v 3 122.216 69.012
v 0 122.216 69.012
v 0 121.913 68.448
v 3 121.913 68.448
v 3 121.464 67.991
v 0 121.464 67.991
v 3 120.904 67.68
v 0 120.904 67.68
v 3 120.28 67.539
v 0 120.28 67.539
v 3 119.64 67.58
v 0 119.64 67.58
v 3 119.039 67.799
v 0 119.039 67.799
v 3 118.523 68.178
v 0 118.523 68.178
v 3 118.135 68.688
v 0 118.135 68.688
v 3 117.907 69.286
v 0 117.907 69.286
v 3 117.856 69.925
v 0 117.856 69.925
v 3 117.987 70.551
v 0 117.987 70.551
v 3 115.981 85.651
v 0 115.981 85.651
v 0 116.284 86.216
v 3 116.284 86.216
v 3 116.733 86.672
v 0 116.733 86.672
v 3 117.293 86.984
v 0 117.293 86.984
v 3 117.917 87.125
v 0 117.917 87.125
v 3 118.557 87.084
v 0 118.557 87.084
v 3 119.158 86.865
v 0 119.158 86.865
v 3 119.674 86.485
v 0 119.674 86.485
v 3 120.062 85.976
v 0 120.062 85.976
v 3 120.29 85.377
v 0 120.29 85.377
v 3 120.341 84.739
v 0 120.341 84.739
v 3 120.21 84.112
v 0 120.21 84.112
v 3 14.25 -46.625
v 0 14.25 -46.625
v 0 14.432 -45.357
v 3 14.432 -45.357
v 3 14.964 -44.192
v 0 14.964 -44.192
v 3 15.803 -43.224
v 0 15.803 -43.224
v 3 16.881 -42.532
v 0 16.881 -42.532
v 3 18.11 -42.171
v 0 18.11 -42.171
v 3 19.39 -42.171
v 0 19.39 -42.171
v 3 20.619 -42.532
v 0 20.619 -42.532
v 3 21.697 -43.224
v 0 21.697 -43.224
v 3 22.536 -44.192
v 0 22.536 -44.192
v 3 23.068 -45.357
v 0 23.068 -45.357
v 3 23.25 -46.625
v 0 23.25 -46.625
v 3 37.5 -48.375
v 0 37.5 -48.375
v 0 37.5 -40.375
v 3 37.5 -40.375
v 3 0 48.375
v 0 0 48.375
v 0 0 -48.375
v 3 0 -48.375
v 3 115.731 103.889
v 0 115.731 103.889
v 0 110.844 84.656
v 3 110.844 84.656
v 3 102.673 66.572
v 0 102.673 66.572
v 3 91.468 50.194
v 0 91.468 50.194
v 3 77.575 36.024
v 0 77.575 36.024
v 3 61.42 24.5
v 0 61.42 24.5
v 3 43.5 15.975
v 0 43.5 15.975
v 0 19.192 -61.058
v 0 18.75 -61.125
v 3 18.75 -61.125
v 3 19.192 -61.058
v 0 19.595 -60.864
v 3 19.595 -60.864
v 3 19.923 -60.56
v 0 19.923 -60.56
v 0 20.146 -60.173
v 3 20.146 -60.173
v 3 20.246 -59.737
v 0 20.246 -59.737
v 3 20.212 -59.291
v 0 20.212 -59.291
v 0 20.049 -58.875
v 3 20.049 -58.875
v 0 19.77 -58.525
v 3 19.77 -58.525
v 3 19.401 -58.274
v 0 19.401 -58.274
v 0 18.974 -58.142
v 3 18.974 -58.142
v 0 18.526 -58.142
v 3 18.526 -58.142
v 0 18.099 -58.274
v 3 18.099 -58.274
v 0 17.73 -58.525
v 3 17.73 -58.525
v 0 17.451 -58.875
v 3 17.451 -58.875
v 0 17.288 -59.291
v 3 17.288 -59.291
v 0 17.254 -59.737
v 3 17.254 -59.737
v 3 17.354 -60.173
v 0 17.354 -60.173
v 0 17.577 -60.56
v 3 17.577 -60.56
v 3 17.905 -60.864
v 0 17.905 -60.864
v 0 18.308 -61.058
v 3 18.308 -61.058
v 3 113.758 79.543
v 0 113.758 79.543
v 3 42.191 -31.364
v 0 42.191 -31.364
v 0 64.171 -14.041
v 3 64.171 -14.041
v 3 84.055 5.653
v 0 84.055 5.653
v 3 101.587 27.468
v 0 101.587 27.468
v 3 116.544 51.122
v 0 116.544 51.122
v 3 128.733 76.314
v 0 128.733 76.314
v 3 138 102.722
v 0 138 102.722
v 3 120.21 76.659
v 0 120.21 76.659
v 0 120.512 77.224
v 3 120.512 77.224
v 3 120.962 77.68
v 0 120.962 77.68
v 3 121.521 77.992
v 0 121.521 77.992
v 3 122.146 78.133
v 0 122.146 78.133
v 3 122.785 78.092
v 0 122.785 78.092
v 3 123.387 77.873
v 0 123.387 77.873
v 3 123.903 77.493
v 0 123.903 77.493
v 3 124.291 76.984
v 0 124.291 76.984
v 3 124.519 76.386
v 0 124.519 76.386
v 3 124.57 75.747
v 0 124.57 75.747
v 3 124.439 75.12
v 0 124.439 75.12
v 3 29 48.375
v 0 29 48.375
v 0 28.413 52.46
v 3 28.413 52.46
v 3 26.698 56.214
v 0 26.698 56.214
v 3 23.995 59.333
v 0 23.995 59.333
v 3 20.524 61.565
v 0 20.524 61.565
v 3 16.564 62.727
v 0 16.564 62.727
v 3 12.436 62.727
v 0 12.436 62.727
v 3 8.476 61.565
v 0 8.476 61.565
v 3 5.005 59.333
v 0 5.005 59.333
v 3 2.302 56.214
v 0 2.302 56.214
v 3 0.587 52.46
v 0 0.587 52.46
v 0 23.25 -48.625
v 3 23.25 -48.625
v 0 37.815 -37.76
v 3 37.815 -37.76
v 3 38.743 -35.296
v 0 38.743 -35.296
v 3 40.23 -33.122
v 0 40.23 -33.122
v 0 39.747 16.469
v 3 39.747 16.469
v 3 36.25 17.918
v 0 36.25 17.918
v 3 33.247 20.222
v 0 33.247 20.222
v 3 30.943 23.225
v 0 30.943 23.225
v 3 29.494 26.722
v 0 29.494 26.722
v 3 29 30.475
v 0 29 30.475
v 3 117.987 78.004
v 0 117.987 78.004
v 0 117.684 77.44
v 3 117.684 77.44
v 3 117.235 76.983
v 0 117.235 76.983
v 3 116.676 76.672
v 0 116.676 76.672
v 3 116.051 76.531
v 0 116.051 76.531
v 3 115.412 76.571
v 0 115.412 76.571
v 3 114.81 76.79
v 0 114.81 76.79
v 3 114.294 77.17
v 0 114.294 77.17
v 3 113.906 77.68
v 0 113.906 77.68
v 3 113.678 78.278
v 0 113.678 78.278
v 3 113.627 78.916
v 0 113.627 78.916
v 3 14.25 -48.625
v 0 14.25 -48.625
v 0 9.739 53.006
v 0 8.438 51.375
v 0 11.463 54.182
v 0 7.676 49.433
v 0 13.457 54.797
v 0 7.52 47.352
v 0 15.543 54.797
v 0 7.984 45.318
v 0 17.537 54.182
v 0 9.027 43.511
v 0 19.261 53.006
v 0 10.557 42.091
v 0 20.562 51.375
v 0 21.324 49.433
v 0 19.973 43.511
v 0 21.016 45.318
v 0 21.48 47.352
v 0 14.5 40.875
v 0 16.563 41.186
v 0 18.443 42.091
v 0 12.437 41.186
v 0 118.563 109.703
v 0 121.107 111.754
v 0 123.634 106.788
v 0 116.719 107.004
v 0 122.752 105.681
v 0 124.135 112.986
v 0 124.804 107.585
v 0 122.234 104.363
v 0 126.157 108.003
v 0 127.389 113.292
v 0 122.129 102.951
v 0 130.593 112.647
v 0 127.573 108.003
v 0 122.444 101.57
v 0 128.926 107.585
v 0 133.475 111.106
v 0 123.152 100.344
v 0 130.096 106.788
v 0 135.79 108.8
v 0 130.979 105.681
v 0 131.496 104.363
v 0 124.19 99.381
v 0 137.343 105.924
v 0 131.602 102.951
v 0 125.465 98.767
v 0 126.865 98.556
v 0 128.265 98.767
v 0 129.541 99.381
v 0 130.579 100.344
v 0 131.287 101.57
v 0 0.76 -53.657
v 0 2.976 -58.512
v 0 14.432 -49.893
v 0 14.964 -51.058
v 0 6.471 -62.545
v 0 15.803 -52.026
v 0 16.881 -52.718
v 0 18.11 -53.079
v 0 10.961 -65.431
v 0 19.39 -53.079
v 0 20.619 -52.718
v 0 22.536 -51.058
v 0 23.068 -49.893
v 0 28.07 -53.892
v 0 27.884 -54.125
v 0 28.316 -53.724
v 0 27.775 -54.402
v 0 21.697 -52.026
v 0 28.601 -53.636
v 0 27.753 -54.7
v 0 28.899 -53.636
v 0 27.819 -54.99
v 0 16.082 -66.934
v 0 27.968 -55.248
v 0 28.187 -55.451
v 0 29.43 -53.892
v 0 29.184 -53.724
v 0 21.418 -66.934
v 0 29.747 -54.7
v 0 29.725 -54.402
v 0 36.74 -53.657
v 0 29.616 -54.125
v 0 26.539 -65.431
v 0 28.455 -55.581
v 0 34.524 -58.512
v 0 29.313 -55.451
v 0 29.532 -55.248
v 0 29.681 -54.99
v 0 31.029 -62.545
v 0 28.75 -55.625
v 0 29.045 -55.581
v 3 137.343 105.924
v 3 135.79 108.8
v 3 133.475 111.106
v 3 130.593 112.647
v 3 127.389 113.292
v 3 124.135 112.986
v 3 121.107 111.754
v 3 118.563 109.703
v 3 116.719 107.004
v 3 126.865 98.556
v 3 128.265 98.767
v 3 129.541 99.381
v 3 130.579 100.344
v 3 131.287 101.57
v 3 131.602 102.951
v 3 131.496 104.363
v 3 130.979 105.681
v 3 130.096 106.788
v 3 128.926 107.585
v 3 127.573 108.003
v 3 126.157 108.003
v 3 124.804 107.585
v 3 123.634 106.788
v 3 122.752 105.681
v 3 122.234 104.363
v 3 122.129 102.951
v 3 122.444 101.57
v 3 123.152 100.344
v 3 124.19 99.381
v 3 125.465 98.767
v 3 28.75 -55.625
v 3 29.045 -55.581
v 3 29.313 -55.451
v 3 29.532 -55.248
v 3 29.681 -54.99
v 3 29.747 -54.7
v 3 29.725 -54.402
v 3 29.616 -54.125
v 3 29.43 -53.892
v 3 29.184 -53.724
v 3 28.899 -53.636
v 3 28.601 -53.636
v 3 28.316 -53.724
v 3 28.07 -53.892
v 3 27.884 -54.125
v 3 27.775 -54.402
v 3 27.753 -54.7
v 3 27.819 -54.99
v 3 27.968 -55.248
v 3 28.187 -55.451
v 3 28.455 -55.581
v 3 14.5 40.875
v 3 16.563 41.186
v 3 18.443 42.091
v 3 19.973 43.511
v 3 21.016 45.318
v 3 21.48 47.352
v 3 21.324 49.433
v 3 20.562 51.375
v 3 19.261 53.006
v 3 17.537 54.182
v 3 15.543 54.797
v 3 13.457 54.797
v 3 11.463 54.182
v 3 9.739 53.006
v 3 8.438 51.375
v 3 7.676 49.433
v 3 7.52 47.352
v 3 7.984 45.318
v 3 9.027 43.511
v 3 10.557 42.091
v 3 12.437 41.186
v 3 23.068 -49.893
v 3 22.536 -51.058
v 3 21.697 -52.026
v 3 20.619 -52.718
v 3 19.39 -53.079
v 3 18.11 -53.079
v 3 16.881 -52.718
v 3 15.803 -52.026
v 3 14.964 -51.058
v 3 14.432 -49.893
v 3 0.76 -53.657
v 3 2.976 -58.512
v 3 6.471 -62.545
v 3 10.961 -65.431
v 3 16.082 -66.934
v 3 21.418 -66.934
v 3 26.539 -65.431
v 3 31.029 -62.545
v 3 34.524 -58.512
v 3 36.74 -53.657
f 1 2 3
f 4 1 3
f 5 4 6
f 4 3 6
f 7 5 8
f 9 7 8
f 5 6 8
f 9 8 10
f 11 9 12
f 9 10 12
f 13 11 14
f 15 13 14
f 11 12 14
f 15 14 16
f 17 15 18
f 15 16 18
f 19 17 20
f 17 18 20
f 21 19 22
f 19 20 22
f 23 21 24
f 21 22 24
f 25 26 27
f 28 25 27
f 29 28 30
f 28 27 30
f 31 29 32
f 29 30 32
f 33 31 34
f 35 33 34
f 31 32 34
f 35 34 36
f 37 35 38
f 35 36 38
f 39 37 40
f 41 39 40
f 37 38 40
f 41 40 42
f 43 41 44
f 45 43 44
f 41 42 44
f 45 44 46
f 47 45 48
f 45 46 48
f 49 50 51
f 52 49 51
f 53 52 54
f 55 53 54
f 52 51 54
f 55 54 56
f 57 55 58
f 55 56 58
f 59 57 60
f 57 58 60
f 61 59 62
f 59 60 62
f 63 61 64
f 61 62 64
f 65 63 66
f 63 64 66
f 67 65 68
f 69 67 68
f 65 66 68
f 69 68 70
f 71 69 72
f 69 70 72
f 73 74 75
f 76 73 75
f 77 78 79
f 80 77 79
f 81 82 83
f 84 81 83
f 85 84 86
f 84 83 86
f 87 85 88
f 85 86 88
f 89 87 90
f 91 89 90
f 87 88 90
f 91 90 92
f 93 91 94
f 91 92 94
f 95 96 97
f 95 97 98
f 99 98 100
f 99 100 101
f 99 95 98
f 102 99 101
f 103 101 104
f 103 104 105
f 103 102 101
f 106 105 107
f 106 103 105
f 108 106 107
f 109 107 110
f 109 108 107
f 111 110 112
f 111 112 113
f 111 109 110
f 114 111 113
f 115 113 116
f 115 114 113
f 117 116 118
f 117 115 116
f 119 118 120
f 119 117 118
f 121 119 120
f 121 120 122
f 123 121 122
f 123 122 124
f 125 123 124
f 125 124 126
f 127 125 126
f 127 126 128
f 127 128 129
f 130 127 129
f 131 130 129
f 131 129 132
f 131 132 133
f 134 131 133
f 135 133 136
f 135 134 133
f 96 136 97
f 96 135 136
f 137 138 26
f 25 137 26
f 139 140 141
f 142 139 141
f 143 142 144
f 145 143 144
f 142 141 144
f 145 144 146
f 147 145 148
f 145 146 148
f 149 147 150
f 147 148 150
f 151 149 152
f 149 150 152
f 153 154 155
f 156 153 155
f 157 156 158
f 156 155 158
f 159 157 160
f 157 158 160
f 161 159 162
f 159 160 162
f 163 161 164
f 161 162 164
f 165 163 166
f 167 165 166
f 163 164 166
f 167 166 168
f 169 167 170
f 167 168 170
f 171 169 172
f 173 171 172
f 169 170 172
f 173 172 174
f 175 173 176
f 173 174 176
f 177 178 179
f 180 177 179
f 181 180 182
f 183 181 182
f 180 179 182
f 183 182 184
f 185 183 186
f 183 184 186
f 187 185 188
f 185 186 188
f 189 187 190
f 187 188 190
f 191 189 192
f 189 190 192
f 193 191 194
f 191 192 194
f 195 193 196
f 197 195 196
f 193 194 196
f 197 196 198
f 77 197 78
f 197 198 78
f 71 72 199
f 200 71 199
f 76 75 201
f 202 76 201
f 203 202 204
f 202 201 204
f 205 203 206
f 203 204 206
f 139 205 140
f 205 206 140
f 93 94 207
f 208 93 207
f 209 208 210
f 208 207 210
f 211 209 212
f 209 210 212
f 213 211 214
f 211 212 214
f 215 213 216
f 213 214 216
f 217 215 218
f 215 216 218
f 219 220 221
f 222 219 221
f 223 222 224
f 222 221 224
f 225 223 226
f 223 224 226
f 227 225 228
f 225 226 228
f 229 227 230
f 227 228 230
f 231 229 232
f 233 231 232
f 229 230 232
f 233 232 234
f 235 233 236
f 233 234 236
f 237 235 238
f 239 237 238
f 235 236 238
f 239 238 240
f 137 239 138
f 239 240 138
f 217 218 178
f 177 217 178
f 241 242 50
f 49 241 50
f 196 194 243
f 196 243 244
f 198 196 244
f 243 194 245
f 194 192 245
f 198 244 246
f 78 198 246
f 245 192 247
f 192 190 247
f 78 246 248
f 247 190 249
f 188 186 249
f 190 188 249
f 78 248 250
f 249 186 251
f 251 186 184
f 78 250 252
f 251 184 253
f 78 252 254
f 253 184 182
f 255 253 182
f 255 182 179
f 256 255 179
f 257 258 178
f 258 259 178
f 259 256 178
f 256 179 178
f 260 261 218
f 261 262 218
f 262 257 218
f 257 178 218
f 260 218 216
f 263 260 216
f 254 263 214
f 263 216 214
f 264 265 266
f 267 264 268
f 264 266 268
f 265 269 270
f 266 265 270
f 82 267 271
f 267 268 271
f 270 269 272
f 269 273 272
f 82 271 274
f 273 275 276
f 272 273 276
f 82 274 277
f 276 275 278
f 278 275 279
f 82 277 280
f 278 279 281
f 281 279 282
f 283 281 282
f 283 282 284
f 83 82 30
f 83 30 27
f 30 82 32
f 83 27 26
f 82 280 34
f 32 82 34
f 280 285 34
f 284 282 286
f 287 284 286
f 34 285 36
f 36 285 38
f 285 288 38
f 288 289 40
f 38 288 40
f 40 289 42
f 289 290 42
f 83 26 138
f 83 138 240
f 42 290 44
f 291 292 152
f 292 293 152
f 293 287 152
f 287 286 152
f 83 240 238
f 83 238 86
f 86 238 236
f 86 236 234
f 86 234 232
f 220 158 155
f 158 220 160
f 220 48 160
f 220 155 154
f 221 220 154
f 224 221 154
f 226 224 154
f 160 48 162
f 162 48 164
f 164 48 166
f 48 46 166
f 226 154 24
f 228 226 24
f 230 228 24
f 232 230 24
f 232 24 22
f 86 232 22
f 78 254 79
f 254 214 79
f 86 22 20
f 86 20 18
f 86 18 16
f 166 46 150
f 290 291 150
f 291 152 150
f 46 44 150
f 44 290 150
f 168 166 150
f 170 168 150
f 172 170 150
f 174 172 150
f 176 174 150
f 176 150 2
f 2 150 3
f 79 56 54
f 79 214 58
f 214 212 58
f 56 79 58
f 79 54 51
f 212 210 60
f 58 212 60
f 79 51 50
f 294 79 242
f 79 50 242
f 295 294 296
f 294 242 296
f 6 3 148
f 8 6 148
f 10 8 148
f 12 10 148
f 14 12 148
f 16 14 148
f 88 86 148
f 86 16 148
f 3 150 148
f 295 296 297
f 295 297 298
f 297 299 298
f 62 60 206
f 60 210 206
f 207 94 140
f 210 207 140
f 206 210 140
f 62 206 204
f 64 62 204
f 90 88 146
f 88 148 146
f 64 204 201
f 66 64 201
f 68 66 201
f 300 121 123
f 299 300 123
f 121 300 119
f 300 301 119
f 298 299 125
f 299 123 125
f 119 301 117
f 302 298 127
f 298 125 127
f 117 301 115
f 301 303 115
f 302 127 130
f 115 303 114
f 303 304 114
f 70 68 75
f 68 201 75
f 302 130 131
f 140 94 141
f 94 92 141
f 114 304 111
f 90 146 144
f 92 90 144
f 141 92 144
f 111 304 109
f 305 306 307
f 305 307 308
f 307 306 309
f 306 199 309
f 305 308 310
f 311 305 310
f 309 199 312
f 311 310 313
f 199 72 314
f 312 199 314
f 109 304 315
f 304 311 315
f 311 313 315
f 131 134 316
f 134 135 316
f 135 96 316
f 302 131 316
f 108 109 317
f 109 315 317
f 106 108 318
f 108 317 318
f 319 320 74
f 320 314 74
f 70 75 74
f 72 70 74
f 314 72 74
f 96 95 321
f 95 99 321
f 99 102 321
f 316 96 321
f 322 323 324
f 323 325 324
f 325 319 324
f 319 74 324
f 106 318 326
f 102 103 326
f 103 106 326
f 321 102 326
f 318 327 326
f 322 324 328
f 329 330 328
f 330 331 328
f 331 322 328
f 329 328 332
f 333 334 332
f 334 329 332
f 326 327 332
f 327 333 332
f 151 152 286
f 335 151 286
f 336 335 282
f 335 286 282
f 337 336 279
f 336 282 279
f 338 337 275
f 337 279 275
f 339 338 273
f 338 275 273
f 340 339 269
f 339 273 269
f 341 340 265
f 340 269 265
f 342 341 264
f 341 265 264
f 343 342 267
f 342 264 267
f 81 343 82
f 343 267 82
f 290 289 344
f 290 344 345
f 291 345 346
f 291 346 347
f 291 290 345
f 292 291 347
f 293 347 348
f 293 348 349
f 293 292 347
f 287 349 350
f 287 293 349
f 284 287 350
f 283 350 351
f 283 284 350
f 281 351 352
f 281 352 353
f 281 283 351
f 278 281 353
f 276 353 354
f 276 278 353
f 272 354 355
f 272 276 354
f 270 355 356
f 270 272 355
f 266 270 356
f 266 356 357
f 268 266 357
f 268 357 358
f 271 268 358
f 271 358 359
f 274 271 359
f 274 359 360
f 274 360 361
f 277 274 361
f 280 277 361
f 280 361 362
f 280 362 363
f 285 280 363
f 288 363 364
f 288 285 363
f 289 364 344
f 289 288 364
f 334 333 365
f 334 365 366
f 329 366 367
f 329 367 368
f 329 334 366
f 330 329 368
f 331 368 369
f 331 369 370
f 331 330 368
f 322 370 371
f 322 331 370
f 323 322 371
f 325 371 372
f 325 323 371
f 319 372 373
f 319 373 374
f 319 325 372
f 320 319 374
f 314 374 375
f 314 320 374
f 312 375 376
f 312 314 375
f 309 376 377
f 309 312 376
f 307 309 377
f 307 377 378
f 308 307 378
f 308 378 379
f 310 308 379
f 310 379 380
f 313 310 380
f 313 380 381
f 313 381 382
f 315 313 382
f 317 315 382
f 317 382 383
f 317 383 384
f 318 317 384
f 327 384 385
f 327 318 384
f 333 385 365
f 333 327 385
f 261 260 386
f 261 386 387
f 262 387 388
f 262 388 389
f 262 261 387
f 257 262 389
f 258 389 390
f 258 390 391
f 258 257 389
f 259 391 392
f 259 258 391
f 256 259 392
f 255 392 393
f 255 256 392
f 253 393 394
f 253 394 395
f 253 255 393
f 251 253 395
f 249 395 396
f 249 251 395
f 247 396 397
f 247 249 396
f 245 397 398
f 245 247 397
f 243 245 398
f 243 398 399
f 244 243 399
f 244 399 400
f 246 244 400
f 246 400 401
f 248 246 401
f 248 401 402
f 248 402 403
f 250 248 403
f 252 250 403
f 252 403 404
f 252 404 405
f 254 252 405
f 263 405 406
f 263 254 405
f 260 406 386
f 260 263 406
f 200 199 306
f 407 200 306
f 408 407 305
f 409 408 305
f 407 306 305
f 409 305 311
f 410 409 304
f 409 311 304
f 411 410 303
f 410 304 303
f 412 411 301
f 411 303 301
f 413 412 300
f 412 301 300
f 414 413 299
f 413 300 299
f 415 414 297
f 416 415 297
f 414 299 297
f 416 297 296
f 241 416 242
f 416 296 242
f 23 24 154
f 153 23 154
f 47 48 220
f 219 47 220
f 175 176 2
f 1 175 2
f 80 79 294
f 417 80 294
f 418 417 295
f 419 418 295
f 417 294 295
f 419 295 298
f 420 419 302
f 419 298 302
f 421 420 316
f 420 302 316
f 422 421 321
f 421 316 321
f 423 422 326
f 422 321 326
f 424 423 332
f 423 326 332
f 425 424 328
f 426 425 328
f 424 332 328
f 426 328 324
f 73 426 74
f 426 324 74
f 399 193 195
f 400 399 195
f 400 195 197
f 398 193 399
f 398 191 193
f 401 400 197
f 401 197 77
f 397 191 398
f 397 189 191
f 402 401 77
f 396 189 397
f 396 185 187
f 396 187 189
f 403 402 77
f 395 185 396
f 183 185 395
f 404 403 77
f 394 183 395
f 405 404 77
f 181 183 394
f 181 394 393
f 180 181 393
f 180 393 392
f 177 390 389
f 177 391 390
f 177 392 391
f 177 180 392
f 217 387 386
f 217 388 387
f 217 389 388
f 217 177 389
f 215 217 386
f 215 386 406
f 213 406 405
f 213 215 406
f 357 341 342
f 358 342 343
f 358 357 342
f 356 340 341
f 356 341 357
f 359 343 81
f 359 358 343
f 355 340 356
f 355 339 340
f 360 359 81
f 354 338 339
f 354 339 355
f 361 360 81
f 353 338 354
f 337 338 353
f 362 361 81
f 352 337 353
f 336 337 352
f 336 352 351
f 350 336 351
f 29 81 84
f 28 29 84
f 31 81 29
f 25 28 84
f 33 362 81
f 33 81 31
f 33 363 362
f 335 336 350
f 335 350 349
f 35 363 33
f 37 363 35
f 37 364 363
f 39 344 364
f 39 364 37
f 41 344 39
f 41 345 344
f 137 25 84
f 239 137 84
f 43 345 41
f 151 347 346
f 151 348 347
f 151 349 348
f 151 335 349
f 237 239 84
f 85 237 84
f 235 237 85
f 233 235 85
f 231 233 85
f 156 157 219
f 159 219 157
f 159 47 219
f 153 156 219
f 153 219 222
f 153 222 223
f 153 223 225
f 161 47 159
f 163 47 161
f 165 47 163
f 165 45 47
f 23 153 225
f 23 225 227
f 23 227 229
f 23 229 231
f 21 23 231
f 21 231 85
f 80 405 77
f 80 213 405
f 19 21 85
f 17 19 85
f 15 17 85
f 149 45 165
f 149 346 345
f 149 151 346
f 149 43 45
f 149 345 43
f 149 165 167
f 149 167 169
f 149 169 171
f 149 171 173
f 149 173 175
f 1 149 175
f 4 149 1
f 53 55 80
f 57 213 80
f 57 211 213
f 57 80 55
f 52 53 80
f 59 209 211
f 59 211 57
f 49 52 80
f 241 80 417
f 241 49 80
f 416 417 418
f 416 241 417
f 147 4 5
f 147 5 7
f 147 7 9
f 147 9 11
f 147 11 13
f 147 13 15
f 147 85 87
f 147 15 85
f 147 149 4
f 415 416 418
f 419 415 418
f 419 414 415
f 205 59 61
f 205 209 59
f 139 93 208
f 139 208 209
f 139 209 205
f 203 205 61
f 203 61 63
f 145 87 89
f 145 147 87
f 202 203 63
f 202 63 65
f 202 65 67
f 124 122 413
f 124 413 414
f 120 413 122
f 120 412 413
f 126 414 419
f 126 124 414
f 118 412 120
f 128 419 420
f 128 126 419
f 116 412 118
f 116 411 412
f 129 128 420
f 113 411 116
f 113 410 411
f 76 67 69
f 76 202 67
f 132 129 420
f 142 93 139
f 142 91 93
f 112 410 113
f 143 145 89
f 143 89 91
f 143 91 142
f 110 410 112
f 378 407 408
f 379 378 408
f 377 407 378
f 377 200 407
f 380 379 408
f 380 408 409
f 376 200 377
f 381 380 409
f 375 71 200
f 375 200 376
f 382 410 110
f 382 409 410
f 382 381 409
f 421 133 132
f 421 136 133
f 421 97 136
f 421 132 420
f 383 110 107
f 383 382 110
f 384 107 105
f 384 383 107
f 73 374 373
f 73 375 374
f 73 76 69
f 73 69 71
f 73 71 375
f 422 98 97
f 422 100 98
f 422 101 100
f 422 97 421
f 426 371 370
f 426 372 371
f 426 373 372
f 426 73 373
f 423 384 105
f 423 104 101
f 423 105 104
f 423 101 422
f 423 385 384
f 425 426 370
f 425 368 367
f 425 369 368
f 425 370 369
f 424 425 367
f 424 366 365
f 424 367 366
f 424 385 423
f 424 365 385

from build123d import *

# Parameters (mm, degrees)
SKETCH1_R           = 1.5
SKETCH1_R_2         = 1
SKETCH1_R_3         = 7
SKETCH1_R_4         = 4.75
BOSS_EXTRUDE1_DEPTH = 3


with BuildPart() as part:
    # Sketch1 → Boss-Extrude1 (new body)
    with BuildSketch(Plane(origin=(0, 0, 0), x_dir=(0, 0, -1), z_dir=(1, 0, 0))):
        with BuildLine():
            Line((-48.375, 0), (48.375, 0))
            ThreePointArc((48.375, 0), (67.125, 18.75), (48.375, 37.5))
            Line((48.375, 37.5), (40.375, 37.5))
            ThreePointArc((40.375, 37.5), (35.295765254, 38.742880835), (31.364327513, 42.1906592))
            ThreePointArc((31.364327513, 42.1906592), (-27.467628368, 101.587088748), (-102.722095146, 138))
            ThreePointArc((-102.722095146, 138), (-113.291936406, 127.38864025), (-103.88918697, 115.730561375))
            ThreePointArc((-103.88918697, 115.730561375), (-50.193524878, 91.468412174), (-15.975, 43.5))
            ThreePointArc((-15.975, 43.5), (-20.221951673, 33.246951673), (-30.475, 29))
            Line((-30.475, 29), (-48.375, 29))
            ThreePointArc((-48.375, 29), (-62.875, 14.5), (-48.375, 0))
        make_face()
        with Locations((59.625, 18.75)):
            Circle(SKETCH1_R, mode=Mode.SUBTRACT)
        with Locations((54.625, 28.75)):
            Circle(SKETCH1_R_2, mode=Mode.SUBTRACT)
        with Locations((-47.875, 14.5)):
            Circle(SKETCH1_R_3, mode=Mode.SUBTRACT)
        with Locations((-103.305641058, 126.865280687)):
            Circle(SKETCH1_R_4, mode=Mode.SUBTRACT)
        with BuildLine():
            Line((46.625, 23.25), (48.625, 23.25))
            ThreePointArc((48.625, 23.25), (53.125, 18.75), (48.625, 14.25))
            Line((48.625, 14.25), (46.625, 14.25))
            ThreePointArc((46.625, 14.25), (42.125, 18.75), (46.625, 23.25))
        make_face(mode=Mode.SUBTRACT)
        with BuildLine():
            Line((-84.112179989, 120.210043762), (-78.004177954, 117.98691283))
            ThreePointArc((-78.004177954, 117.98691283), (-76.659414879, 115.103059111), (-79.543268599, 113.758296037))
            Line((-79.543268599, 113.758296037), (-85.651270634, 115.981426968))
            ThreePointArc((-85.651270634, 115.981426968), (-86.996033708, 118.865280687), (-84.112179989, 120.210043762))
        make_face(mode=Mode.SUBTRACT)
        with BuildLine():
            Line((-75.120324234, 124.438660555), (-69.012322199, 122.215529624))
            ThreePointArc((-69.012322199, 122.215529624), (-67.667559125, 119.331675904), (-70.551412844, 117.98691283))
            Line((-70.551412844, 117.98691283), (-76.659414879, 120.210043762))
            ThreePointArc((-76.659414879, 120.210043762), (-78.004177954, 123.093897481), (-75.120324234, 124.438660555))
        make_face(mode=Mode.SUBTRACT)
    extrude(amount=BOSS_EXTRUDE1_DEPTH)


solid = part.part
